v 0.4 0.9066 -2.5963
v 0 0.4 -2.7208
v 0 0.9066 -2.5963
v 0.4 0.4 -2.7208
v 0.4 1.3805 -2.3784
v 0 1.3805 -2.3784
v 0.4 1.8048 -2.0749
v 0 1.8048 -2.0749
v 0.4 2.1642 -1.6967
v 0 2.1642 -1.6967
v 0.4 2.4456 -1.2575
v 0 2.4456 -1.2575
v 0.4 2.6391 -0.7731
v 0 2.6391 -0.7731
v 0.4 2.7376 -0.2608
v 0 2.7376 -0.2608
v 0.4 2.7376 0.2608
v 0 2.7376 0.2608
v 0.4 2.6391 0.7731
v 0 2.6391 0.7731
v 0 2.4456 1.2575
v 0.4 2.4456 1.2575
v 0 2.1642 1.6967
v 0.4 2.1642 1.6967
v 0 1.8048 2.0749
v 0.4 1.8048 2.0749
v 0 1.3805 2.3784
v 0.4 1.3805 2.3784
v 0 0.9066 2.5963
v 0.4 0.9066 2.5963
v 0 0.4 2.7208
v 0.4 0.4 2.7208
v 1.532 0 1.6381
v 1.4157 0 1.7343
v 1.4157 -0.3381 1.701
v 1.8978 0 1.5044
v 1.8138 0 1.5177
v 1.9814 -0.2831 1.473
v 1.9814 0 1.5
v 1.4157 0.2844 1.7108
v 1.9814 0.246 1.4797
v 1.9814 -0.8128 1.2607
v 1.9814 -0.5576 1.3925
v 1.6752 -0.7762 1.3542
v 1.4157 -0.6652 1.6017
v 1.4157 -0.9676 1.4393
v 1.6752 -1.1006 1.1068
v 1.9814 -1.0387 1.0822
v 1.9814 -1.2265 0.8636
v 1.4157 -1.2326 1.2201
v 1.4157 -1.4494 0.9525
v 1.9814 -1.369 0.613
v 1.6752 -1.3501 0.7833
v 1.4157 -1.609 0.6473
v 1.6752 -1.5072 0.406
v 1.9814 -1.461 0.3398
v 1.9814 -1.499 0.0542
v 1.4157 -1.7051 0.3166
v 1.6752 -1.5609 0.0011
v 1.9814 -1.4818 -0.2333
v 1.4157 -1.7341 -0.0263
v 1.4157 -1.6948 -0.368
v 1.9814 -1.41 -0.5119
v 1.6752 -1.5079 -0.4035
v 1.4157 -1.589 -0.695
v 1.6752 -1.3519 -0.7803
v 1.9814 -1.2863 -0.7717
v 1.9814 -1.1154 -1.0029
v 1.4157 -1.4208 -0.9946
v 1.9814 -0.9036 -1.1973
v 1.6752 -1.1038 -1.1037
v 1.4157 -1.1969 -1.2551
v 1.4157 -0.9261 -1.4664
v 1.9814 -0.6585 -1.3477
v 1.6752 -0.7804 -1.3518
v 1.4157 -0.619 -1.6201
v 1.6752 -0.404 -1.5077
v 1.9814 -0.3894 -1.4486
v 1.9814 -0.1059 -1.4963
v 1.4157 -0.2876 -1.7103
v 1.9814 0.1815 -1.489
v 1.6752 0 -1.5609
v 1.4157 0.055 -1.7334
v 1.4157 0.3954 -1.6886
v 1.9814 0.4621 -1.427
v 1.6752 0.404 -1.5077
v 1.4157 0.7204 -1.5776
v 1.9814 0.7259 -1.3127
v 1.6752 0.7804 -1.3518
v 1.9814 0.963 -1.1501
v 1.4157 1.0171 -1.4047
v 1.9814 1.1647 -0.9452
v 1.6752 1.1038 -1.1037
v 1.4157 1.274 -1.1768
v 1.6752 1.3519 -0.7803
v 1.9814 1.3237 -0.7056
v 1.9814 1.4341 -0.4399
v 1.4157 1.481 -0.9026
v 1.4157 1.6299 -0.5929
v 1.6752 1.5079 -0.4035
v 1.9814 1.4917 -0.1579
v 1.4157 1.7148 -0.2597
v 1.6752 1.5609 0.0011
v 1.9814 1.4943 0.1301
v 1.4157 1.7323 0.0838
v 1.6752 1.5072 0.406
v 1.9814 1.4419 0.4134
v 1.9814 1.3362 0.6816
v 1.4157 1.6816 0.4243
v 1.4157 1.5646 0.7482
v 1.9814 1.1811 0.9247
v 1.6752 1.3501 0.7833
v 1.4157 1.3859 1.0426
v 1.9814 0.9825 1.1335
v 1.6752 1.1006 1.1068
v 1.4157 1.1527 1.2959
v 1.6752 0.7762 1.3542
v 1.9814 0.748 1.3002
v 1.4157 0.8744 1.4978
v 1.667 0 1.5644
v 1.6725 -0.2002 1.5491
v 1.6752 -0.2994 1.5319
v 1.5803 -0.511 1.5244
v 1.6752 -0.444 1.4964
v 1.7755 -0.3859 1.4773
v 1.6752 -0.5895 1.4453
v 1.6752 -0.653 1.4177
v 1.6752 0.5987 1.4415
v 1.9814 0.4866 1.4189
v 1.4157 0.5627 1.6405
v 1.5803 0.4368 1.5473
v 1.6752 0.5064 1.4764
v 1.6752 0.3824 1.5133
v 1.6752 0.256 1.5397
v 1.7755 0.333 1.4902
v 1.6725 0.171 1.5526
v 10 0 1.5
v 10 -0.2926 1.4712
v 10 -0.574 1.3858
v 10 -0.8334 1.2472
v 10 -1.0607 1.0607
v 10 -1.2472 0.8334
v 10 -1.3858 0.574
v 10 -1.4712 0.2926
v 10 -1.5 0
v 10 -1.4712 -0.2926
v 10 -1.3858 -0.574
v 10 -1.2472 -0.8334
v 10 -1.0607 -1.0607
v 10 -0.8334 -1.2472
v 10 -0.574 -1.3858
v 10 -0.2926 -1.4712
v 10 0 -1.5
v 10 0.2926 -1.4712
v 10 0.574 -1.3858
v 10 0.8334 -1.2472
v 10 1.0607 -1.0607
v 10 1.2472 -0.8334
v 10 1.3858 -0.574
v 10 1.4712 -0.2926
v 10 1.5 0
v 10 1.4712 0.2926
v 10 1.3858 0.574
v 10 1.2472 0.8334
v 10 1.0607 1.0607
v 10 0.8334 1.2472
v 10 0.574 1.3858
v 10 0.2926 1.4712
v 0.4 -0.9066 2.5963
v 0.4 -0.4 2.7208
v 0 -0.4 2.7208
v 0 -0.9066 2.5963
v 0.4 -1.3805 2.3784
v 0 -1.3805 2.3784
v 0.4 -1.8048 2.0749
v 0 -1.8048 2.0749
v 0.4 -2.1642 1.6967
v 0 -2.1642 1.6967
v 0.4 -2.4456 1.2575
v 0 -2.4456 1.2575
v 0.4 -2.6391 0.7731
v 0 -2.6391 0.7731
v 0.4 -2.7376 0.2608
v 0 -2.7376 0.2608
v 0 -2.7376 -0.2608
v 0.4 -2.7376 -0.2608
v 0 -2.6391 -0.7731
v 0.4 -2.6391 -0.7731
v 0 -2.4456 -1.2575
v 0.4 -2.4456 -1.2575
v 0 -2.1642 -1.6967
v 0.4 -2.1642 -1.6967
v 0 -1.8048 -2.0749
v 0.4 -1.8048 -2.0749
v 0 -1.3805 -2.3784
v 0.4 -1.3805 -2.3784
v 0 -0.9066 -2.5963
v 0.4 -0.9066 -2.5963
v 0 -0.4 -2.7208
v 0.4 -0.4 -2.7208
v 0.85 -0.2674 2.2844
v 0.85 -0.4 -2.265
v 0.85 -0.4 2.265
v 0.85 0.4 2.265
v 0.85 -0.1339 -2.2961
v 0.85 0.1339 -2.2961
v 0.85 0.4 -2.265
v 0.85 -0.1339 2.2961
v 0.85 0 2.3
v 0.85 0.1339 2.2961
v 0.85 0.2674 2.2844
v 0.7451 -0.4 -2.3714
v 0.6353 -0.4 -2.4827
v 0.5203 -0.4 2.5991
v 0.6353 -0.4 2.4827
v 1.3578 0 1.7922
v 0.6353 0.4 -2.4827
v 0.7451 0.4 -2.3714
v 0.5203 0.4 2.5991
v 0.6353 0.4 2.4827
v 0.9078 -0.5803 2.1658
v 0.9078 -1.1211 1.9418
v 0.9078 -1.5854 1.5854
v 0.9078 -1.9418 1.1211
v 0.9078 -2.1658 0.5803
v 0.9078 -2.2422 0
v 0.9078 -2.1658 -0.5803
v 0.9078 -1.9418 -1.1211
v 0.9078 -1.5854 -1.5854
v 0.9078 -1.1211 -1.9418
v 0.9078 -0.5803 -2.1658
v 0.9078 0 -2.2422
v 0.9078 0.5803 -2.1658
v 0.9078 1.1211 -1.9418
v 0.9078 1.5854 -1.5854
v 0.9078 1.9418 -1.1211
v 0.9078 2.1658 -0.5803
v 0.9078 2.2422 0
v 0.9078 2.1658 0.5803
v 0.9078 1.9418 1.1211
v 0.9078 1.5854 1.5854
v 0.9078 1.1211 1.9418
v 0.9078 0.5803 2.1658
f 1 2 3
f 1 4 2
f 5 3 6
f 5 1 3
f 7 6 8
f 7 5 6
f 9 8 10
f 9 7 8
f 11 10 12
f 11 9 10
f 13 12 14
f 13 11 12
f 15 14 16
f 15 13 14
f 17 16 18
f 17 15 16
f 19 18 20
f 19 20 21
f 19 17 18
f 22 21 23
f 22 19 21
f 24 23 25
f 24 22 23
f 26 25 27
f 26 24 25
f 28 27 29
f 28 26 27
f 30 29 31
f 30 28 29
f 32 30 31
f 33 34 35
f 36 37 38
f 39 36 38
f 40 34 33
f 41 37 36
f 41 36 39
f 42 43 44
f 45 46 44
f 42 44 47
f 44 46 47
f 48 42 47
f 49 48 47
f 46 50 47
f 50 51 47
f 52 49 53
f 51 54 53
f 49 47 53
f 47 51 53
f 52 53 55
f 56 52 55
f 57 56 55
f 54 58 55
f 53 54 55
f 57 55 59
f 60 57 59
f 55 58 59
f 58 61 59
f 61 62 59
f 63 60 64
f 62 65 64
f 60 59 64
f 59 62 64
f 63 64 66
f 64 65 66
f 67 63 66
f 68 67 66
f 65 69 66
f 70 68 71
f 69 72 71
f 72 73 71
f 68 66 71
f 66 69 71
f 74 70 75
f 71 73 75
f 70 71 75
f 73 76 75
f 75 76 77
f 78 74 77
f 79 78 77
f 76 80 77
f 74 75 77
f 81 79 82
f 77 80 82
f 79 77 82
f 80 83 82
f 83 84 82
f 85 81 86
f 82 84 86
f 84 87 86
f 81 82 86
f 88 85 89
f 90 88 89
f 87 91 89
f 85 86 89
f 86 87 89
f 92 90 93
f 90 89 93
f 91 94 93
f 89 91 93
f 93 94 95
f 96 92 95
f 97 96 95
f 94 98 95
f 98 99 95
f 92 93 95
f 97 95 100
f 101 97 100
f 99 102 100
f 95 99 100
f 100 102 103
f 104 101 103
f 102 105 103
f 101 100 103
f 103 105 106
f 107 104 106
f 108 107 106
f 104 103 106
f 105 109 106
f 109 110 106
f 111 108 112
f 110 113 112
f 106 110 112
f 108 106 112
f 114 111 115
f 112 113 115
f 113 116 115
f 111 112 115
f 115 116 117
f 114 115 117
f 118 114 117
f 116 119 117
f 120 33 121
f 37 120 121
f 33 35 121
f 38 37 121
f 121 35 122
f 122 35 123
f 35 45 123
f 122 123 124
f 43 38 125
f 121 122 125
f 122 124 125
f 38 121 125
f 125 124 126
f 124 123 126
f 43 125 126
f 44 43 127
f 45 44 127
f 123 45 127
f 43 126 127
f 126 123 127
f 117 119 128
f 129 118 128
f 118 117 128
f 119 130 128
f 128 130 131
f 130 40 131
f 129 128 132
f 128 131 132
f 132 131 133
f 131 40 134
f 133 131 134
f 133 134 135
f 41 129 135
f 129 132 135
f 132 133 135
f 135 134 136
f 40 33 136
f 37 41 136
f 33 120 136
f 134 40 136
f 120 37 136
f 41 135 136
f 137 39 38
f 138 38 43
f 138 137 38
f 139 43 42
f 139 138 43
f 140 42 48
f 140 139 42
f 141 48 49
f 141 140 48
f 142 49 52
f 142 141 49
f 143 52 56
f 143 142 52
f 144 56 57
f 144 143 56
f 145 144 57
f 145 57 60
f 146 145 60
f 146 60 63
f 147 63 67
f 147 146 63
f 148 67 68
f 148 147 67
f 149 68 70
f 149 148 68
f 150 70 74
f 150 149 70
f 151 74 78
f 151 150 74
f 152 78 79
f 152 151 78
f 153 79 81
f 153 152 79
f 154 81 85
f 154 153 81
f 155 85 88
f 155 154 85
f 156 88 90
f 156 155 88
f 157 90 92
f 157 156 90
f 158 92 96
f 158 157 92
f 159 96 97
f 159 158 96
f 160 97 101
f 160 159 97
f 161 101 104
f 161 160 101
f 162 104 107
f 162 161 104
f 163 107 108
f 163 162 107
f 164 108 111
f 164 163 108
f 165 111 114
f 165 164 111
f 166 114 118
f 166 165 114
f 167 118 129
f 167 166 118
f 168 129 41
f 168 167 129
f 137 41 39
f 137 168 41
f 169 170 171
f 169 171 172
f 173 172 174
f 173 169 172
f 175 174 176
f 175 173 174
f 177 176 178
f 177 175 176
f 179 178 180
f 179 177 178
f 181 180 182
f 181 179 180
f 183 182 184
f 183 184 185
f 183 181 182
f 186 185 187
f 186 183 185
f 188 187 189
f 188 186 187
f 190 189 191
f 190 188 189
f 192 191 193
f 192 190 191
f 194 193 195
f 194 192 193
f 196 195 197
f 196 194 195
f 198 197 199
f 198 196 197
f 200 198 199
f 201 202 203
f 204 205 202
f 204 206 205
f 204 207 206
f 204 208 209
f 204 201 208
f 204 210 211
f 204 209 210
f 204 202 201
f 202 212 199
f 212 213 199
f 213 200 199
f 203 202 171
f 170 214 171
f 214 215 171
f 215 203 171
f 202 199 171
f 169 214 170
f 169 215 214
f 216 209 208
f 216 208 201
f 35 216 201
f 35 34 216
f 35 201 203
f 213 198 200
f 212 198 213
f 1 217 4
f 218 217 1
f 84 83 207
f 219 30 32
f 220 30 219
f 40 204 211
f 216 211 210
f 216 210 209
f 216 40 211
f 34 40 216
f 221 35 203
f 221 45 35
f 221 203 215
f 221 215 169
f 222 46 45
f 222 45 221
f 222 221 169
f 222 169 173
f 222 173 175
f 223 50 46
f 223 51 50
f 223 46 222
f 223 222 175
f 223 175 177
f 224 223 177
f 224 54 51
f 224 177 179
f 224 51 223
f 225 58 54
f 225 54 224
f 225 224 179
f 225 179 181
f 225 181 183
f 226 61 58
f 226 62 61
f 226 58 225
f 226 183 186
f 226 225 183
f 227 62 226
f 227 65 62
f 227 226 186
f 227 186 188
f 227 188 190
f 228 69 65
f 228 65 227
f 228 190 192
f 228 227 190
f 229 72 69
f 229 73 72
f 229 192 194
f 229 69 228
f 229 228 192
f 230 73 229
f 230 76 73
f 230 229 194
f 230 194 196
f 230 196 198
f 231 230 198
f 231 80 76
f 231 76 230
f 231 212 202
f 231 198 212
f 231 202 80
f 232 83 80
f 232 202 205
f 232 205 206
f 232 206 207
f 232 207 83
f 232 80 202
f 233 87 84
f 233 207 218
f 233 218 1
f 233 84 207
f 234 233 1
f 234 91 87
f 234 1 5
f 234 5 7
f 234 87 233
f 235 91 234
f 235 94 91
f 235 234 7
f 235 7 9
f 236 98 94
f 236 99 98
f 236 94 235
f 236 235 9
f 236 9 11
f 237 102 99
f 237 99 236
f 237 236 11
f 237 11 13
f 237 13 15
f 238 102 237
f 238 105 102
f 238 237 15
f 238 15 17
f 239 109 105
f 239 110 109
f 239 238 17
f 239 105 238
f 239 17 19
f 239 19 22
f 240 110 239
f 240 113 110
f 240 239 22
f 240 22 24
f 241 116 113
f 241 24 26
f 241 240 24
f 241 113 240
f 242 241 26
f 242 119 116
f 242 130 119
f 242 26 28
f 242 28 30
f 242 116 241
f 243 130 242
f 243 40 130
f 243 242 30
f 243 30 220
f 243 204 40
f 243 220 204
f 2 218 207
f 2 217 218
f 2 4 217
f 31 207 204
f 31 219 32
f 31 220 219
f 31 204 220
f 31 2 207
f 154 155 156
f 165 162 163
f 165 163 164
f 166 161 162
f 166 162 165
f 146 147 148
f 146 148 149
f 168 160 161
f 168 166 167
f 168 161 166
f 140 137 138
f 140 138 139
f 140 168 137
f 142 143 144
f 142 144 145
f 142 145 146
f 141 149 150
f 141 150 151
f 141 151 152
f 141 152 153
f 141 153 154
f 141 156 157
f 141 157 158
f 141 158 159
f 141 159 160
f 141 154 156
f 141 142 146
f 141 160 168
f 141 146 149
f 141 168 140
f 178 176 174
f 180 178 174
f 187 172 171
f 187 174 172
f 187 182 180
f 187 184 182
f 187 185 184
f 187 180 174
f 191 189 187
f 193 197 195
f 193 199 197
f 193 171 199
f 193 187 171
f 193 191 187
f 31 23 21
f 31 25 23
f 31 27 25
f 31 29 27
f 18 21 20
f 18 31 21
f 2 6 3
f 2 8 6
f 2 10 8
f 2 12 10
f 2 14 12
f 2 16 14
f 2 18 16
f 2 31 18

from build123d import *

# Parameters (mm, degrees)
FILLET1_R  = 0.8
SKETCH2_W  = 5.5
SKETCH2_H  = 0.8
SLOT_DEPTH = 0.85


with BuildPart() as part:
    # BodySke → Base-Revolve (revolve)
    with BuildSketch(Plane.XY, mode=Mode.PRIVATE) as base_revolve_sk:
        Polygon((0, 0), (0, 2.75), (0.4, 2.75), (1.65, 1.5), (10, 1.5), (10, 0), align=None)
    revolve(base_revolve_sk.sketch.rotate(Axis((-6.35, 0, 0), (1, 0, 0)), 90), axis=Axis((-6.35, 0, 0), (1, 0, 0)))  # turned: the seam where the file's is

    # Fillet1
    fillet1_edges = [part.edges().sort_by_distance(p)[0] for p in [
        (1.65, 0, -1.5),
    ]]
    fillet(fillet1_edges, radius=FILLET1_R)

    # Sketch2 → Slot (cut)
    with BuildSketch(Plane.ZY):
        Rectangle(SKETCH2_W, SKETCH2_H)
    extrude(amount=-SLOT_DEPTH, mode=Mode.SUBTRACT)


solid = part.part
